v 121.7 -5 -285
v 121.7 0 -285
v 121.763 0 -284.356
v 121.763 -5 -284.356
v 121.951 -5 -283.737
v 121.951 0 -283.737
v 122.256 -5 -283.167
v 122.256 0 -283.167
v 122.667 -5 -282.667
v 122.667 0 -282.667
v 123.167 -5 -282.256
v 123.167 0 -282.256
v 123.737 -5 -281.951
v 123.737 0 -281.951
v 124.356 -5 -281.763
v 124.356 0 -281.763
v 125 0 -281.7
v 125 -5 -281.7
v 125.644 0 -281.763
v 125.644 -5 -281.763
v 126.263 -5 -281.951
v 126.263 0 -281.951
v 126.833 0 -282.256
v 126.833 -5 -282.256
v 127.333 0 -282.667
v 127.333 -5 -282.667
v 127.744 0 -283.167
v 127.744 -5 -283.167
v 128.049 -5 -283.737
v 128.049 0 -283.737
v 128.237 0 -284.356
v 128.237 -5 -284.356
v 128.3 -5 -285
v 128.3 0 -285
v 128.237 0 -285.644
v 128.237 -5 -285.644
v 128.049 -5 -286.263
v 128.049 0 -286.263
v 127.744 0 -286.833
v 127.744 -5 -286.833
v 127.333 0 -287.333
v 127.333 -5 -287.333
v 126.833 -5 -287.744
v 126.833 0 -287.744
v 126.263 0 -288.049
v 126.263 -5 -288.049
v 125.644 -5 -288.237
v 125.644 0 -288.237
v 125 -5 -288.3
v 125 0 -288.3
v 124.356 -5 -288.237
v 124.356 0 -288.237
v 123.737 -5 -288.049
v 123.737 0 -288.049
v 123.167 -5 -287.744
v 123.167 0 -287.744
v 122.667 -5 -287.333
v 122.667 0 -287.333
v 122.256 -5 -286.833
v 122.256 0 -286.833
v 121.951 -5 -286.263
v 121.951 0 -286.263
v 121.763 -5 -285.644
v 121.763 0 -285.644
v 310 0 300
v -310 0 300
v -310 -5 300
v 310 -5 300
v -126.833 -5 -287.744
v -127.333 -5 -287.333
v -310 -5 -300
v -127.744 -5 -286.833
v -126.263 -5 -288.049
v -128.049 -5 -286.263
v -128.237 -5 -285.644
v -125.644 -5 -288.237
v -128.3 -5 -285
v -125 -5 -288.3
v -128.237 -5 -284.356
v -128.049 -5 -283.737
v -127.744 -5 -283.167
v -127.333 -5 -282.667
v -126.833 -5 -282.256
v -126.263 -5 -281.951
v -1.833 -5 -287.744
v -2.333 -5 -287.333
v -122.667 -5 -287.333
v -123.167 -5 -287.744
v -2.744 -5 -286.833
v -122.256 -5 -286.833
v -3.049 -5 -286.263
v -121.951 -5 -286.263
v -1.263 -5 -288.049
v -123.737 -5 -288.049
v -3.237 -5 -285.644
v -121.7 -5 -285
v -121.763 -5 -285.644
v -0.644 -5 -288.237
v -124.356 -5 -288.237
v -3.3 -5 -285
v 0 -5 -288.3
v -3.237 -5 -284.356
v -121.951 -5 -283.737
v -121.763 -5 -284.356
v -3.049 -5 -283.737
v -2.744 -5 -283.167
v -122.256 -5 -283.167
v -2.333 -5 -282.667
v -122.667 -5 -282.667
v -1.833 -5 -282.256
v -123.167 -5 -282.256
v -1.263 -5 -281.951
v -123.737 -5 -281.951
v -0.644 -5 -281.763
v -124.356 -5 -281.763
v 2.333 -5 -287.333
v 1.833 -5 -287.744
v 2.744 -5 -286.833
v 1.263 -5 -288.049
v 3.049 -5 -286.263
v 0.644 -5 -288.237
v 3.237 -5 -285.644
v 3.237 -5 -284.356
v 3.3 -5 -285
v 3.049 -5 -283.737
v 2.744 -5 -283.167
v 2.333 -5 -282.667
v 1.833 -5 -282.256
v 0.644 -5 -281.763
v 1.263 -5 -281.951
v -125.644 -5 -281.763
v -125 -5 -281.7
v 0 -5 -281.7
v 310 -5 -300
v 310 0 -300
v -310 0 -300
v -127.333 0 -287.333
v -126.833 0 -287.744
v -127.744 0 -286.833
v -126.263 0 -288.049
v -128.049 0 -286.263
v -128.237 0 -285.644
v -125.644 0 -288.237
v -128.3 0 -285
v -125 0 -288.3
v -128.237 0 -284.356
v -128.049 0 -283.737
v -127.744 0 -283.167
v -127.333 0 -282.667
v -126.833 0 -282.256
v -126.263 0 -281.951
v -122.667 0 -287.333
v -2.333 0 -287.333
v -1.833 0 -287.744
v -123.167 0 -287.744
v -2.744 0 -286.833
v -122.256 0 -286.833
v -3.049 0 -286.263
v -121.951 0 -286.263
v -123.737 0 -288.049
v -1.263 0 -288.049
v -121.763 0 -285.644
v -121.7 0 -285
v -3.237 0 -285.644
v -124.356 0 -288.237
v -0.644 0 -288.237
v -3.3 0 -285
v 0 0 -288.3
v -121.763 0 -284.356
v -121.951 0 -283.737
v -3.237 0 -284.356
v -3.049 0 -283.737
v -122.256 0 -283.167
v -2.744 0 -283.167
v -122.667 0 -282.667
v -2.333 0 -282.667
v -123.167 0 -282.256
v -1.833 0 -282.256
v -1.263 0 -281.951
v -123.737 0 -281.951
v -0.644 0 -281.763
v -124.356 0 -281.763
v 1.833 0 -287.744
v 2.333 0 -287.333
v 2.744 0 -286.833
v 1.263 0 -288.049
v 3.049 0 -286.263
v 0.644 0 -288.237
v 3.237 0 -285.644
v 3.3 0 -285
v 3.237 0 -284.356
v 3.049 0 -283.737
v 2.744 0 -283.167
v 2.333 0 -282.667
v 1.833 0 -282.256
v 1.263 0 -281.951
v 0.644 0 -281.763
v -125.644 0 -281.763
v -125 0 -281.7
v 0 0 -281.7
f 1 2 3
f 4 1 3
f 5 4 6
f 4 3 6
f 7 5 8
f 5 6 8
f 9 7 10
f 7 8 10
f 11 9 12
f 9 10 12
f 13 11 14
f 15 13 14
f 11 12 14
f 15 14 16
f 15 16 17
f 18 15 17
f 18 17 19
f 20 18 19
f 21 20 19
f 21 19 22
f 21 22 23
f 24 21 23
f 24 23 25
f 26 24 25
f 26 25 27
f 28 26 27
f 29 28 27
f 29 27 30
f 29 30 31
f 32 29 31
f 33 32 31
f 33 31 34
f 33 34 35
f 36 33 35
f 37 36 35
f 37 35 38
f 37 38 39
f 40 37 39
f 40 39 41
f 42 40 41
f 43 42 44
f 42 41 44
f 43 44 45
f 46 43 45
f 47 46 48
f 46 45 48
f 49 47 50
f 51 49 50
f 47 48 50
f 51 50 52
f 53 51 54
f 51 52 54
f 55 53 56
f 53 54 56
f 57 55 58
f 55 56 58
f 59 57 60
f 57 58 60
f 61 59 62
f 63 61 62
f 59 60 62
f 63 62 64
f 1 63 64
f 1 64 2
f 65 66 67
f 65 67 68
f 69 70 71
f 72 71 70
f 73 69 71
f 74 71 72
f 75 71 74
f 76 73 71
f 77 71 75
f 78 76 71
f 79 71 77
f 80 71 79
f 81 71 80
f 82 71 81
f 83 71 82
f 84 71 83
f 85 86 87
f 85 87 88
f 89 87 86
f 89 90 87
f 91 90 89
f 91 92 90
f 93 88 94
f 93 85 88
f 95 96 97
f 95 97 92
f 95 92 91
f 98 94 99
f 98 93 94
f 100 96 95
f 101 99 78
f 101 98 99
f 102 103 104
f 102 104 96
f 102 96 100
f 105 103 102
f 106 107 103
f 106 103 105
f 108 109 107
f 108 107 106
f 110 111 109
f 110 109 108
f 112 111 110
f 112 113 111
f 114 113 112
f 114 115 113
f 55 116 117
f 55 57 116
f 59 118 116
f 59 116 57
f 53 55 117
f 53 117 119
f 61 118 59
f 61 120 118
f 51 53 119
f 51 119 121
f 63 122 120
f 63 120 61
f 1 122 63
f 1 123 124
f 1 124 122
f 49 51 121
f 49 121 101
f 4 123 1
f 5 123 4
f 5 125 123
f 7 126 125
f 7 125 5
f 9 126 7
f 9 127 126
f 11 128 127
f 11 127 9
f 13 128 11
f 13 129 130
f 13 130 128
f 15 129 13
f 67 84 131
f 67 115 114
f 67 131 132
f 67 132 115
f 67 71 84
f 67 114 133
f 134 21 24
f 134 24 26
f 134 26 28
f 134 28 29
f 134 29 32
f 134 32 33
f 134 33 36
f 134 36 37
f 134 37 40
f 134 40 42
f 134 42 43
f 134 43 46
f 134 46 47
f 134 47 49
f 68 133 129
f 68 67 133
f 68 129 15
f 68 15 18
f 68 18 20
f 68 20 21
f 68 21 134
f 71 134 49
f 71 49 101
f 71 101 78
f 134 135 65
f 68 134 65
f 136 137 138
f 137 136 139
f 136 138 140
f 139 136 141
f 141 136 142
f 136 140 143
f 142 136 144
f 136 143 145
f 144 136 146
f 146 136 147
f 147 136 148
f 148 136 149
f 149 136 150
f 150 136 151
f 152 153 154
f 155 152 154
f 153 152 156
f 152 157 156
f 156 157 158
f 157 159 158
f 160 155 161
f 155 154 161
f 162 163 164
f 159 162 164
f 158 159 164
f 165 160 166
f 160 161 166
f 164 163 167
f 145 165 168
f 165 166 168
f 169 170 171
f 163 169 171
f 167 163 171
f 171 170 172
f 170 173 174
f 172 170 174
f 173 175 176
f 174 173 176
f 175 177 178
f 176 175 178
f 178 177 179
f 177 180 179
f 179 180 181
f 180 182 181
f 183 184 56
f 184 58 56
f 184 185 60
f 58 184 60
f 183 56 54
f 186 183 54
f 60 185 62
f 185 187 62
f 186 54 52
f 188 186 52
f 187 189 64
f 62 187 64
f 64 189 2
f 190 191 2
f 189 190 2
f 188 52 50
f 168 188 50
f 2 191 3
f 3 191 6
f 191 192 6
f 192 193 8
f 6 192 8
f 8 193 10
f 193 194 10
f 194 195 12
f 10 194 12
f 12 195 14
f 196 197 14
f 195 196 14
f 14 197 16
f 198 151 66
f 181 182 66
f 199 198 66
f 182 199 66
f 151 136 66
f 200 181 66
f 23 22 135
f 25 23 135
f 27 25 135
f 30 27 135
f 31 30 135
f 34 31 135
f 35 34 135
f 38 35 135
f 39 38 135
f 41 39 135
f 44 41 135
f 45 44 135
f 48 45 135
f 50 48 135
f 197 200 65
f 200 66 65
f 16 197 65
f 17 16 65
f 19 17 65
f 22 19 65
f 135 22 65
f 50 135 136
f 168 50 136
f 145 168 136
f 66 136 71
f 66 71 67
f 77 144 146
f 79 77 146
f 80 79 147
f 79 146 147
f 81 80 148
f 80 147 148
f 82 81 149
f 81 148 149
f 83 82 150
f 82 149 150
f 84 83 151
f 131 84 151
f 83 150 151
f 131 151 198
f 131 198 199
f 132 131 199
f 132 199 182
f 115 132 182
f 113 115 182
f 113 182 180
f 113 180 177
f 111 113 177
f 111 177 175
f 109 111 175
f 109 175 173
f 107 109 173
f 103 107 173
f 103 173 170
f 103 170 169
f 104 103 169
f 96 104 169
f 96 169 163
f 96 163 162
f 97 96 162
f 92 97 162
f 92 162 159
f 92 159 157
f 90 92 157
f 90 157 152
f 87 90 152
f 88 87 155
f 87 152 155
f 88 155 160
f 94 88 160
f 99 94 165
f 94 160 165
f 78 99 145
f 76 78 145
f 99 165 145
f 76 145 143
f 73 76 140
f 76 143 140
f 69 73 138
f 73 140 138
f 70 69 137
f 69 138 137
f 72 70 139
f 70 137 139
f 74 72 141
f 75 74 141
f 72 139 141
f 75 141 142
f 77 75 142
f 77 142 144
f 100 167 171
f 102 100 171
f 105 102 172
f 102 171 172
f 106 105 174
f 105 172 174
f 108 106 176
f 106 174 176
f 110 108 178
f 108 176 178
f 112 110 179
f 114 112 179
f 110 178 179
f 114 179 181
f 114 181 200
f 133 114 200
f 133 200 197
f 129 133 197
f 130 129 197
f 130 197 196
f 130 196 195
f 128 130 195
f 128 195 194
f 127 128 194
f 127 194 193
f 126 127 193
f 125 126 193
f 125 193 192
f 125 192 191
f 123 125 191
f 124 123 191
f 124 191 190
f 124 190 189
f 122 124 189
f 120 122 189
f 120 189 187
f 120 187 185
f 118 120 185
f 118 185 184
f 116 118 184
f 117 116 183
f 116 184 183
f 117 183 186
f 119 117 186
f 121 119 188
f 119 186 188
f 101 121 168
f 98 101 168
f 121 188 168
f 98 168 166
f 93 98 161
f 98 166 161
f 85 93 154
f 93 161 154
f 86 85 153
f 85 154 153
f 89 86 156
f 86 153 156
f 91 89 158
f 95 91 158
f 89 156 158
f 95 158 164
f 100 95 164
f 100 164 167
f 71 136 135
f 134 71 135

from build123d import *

# Parameters (mm, degrees)
F0_W     = 620
F0_H     = 600
F1_DEPTH = 5
F3_D     = 6.6


# Not quite as in the source:
# - a feature names something its author has since deleted; it is built from what else it names


with BuildPart() as f1:
    # F0 (on Front) → F1 (new body)
    with BuildSketch(Plane.XZ):
        Rectangle(F0_W, F0_H)
    extrude(amount=F1_DEPTH)

    # F3 (through all)
    with Locations(Plane.XZ.offset(5)):
        with Locations((-125, -285), (125, -285), (0, -285)):
            Hole(F3_D / 2)


solid = f1.part
